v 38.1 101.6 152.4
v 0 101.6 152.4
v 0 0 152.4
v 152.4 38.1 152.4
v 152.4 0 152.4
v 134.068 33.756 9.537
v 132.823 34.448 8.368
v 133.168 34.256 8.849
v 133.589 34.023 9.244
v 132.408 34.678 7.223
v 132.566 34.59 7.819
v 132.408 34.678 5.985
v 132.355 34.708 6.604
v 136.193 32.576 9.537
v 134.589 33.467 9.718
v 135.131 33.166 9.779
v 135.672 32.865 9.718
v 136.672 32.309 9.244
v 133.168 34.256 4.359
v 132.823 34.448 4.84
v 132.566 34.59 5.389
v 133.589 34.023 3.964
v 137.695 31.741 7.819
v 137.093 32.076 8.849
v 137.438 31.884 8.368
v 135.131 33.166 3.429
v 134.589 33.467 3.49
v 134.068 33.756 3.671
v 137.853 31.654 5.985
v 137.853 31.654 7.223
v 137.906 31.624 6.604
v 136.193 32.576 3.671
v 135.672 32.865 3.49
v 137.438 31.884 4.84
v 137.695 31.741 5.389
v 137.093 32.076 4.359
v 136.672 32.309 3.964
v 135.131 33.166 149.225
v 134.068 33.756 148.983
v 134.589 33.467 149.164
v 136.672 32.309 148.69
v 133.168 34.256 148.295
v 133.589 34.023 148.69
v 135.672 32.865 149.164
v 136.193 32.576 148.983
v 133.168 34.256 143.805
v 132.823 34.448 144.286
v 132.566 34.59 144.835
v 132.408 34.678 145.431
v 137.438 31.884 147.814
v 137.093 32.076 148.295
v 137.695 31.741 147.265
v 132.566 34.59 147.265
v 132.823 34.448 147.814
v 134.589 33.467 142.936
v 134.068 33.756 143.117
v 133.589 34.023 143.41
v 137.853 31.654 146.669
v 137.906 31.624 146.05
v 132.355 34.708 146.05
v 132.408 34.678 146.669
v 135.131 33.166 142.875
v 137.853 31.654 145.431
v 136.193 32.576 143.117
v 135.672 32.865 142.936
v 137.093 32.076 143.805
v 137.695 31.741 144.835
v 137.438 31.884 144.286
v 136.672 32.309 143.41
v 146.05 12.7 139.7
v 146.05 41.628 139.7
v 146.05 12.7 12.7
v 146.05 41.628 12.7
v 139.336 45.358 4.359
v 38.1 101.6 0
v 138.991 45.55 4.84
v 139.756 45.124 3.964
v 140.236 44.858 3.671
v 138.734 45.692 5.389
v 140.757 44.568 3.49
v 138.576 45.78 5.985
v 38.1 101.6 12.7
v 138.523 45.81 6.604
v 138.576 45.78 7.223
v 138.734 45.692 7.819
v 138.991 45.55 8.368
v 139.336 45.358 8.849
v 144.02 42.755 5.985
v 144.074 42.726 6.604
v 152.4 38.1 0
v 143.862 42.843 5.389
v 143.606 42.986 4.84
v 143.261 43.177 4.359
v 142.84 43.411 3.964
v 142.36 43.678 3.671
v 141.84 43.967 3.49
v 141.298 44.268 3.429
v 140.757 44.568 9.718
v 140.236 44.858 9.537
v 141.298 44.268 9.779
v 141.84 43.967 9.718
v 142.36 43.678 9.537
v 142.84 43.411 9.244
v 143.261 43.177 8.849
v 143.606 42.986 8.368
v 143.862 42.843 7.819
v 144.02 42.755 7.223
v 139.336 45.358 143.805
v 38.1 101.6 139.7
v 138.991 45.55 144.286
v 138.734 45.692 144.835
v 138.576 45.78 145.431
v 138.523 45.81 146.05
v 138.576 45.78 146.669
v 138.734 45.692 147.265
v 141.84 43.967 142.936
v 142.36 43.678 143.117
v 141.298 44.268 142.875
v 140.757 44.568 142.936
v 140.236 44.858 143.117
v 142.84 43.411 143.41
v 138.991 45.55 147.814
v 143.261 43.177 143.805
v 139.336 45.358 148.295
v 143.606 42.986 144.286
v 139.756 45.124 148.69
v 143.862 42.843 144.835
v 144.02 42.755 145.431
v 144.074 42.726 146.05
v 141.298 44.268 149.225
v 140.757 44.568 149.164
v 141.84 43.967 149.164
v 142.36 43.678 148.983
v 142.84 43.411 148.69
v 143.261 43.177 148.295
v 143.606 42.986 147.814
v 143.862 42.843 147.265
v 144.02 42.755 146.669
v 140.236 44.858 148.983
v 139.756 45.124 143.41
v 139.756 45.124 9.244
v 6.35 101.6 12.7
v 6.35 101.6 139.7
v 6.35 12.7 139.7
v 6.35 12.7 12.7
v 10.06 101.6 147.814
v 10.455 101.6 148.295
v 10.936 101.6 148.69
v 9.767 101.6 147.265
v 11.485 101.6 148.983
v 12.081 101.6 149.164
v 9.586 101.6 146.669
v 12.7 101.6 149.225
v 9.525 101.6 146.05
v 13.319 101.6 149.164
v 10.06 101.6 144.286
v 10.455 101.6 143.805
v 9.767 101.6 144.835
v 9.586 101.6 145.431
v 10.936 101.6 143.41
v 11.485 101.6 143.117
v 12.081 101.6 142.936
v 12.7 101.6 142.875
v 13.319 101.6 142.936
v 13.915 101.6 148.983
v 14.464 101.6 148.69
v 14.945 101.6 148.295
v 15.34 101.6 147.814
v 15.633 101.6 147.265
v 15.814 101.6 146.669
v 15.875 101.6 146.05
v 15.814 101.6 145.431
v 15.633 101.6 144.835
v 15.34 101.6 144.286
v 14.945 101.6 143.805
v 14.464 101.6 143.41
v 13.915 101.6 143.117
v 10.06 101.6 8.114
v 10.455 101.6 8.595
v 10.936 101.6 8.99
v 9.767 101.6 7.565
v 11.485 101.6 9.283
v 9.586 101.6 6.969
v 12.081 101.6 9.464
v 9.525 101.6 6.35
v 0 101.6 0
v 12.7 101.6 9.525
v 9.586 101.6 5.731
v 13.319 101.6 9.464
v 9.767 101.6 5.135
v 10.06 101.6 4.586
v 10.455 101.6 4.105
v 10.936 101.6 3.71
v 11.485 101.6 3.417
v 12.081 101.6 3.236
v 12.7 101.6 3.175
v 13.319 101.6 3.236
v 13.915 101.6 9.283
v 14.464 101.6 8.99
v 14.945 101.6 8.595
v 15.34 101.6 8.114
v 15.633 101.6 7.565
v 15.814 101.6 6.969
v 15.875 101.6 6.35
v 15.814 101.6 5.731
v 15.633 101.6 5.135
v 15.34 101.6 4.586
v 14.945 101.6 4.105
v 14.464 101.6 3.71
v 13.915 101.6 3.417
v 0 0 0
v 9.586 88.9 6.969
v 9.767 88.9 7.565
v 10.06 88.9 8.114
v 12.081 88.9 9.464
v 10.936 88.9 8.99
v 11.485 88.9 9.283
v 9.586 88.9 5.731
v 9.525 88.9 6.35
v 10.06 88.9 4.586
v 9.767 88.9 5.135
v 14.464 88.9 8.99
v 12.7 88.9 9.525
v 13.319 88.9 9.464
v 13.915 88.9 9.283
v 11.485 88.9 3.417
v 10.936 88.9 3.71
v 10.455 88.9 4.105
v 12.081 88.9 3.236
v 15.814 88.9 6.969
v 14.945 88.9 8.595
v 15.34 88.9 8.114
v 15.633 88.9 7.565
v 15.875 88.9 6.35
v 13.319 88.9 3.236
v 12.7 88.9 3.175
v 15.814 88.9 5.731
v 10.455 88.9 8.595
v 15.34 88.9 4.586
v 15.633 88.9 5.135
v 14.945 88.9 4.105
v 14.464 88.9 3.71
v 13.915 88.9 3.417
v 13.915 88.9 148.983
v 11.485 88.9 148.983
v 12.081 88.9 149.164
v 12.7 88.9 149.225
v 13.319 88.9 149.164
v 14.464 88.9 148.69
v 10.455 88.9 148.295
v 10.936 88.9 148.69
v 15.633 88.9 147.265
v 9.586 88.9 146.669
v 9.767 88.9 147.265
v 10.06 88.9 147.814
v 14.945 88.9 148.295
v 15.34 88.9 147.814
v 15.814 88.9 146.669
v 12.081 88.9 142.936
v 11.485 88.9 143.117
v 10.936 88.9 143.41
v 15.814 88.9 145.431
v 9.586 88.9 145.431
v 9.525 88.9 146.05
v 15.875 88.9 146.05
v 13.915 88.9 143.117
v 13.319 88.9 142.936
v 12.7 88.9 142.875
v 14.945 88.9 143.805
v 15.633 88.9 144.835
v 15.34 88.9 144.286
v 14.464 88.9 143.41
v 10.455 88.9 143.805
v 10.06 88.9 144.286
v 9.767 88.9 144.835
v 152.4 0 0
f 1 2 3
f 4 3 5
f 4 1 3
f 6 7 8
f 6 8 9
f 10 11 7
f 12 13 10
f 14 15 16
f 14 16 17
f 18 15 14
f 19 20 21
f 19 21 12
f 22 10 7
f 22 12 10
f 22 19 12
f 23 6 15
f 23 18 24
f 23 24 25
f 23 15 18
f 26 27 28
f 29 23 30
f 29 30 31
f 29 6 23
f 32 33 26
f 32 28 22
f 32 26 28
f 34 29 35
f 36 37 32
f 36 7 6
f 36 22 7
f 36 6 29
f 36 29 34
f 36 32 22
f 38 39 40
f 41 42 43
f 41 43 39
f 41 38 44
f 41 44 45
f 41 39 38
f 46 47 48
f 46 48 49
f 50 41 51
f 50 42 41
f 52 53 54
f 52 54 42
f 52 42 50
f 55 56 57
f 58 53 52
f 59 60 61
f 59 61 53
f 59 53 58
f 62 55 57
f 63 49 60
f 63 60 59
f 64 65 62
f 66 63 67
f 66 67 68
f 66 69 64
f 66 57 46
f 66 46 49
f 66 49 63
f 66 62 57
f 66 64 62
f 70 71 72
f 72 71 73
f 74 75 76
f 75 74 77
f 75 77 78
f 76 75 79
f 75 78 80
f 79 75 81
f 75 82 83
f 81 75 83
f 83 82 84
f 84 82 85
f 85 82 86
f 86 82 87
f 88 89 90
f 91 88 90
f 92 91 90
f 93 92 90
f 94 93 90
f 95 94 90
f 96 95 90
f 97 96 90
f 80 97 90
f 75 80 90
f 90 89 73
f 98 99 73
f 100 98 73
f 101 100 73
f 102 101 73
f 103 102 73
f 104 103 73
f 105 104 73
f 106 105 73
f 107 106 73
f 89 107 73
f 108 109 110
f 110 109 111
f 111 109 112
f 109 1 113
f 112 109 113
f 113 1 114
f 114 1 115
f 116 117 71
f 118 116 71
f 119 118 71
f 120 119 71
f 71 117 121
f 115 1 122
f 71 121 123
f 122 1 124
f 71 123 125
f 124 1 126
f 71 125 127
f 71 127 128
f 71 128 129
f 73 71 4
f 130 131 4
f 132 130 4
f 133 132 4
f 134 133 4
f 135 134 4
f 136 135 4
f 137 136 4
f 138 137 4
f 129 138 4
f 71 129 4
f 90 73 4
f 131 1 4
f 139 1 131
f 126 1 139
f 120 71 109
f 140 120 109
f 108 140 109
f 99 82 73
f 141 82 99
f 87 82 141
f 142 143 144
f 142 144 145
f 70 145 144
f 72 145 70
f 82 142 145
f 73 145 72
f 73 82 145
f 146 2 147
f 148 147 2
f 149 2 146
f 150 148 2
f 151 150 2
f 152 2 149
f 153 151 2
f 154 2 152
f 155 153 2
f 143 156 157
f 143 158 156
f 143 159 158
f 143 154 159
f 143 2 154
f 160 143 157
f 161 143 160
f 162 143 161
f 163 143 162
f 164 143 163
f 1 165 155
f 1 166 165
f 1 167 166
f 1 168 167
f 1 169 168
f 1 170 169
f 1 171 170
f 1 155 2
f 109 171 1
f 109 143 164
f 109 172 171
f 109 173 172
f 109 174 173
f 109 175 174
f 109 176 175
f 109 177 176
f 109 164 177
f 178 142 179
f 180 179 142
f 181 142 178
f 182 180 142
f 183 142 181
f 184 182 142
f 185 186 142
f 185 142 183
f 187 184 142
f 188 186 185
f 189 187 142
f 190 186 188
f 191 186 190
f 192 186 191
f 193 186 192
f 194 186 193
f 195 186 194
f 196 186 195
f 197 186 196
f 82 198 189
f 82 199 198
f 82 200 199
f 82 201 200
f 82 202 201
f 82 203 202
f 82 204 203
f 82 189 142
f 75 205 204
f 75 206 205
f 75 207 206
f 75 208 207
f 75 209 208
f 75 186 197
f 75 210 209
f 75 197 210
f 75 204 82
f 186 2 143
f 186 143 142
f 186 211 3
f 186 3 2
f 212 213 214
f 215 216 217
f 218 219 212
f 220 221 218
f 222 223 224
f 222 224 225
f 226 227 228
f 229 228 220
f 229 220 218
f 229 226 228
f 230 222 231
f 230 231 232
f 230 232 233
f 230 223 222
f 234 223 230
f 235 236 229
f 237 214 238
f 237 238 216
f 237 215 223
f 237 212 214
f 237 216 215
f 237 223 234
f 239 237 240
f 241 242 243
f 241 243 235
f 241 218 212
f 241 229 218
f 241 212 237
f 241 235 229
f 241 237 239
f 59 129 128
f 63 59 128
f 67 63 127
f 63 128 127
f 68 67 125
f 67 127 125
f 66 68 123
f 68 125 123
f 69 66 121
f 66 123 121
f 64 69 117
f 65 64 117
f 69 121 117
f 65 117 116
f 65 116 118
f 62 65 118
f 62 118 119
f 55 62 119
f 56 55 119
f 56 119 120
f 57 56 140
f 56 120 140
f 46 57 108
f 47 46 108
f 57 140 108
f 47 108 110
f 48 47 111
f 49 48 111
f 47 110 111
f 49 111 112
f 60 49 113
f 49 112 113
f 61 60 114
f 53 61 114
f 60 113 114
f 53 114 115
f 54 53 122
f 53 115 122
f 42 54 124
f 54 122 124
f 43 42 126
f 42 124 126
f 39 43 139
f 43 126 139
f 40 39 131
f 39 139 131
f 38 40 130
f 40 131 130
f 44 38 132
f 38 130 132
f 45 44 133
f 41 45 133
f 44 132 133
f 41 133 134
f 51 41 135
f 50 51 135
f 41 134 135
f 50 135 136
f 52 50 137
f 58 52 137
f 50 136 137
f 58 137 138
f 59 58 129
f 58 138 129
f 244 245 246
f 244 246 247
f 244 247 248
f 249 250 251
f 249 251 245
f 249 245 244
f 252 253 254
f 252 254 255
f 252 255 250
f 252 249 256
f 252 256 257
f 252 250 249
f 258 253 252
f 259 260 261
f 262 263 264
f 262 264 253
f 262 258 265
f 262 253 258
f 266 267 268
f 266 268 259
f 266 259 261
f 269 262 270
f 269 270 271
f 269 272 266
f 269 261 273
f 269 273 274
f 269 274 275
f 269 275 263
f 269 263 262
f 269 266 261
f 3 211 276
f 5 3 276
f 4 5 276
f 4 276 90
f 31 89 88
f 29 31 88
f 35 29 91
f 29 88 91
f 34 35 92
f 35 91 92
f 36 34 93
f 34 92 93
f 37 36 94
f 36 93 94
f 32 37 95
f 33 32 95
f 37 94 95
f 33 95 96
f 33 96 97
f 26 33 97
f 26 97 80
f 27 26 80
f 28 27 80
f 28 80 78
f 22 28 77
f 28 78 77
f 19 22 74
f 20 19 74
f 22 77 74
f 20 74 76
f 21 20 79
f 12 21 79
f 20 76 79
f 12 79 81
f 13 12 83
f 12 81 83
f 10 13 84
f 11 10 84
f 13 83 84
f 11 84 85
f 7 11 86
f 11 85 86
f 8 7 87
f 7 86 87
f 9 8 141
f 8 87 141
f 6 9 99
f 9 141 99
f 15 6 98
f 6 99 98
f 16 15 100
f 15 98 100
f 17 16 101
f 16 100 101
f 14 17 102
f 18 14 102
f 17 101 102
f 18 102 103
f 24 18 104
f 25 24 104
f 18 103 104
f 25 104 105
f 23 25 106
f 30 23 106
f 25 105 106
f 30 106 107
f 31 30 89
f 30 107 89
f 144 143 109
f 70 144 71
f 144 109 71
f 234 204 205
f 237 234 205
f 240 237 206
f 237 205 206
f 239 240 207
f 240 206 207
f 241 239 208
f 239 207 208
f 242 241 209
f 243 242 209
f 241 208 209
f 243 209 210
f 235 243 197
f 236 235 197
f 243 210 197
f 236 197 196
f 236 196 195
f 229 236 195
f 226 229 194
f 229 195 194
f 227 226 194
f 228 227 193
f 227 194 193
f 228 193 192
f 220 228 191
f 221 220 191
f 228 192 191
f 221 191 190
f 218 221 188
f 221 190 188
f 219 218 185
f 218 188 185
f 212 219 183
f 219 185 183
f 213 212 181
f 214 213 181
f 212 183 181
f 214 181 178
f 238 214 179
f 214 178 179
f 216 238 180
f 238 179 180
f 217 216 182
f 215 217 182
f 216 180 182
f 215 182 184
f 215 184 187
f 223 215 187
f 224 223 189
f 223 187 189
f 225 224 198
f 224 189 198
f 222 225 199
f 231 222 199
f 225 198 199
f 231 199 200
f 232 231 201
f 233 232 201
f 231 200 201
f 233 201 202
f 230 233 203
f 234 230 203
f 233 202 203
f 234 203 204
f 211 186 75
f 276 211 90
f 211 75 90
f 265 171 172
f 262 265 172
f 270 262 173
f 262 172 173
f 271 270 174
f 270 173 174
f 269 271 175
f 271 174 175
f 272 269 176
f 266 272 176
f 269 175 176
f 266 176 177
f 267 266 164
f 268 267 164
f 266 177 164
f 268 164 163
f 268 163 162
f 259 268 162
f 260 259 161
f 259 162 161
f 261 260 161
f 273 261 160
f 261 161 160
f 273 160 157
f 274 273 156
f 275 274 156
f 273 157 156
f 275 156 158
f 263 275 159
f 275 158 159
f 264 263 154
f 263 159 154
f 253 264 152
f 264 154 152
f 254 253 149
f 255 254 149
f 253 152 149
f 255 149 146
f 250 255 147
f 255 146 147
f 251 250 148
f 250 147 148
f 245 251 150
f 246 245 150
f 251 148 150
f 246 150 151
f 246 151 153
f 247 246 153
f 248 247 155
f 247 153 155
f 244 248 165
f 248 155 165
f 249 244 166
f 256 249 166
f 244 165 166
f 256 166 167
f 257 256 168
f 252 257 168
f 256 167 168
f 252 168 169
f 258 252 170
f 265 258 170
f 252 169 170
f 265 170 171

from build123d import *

# Parameters (mm, degrees)
SKETCH1_W           = 152.4
SKETCH1_H           = 101.6
BOSS_EXTRUDE1_DEPTH = 152.4
CUT_EXTRUDE2_DEPTH  = 152.4
SKETCH7_W           = 139.7
SKETCH7_H           = 127
CUT_EXTRUDE3_DEPTH  = 88.9
SKETCH8_R           = 3.175
CUT_EXTRUDE4_DEPTH  = 12.7
SKETCH9_R           = 3.175
CUT_EXTRUDE5_DEPTH  = 12.7


with BuildPart() as part:
    # Sketch1 → Boss-Extrude1 (new body)
    with BuildSketch(Plane.XY):
        with Locations((76.2, 50.8)):
            Rectangle(SKETCH1_W, SKETCH1_H)
    extrude(amount=BOSS_EXTRUDE1_DEPTH)

    # Sketch6 → Cut-Extrude2 (cut)
    with BuildSketch(Plane.XY.offset(152.4)):
        Polygon((104.436678767, 101.6), (38.1, 101.6), (152.4, 38.1), (152.4, 101.6), (104.590197544, 101.6), align=None)
    extrude(amount=-CUT_EXTRUDE2_DEPTH, mode=Mode.SUBTRACT)

    # Sketch7 → Cut-Extrude3 (cut)
    with BuildSketch(Plane(origin=(0, 101.6, 0), x_dir=(1, 0, 0), z_dir=(0, 1, 0))):
        with Locations((76.2, -76.2)):
            Rectangle(SKETCH7_W, SKETCH7_H)
    extrude(amount=-CUT_EXTRUDE3_DEPTH, mode=Mode.SUBTRACT)

    # Sketch8 → Cut-Extrude4 (cut)
    with BuildSketch(Plane(origin=(0, 101.6, 0), x_dir=(1, 0, 0), z_dir=(0, 1, 0))):
        with Locations((12.7, -146.05)):
            Circle(SKETCH8_R)
        with Locations((12.7, -6.35)):
            Circle(SKETCH8_R)
    extrude(amount=-CUT_EXTRUDE4_DEPTH, mode=Mode.SUBTRACT)

    # Sketch9 → Cut-Extrude5 (cut)
    with BuildSketch(Plane(origin=(52.117924528, 93.812264151, 0), x_dir=(0.874157276, -0.485642931, 0), z_dir=(0.485642931, 0.874157276, 0))):
        with Locations((102.018573203, -146.05)):
            Circle(SKETCH9_R)
        with Locations((102.018573203, -6.604)):
            Circle(SKETCH9_R)
    extrude(amount=-CUT_EXTRUDE5_DEPTH, mode=Mode.SUBTRACT)


solid = part.part
